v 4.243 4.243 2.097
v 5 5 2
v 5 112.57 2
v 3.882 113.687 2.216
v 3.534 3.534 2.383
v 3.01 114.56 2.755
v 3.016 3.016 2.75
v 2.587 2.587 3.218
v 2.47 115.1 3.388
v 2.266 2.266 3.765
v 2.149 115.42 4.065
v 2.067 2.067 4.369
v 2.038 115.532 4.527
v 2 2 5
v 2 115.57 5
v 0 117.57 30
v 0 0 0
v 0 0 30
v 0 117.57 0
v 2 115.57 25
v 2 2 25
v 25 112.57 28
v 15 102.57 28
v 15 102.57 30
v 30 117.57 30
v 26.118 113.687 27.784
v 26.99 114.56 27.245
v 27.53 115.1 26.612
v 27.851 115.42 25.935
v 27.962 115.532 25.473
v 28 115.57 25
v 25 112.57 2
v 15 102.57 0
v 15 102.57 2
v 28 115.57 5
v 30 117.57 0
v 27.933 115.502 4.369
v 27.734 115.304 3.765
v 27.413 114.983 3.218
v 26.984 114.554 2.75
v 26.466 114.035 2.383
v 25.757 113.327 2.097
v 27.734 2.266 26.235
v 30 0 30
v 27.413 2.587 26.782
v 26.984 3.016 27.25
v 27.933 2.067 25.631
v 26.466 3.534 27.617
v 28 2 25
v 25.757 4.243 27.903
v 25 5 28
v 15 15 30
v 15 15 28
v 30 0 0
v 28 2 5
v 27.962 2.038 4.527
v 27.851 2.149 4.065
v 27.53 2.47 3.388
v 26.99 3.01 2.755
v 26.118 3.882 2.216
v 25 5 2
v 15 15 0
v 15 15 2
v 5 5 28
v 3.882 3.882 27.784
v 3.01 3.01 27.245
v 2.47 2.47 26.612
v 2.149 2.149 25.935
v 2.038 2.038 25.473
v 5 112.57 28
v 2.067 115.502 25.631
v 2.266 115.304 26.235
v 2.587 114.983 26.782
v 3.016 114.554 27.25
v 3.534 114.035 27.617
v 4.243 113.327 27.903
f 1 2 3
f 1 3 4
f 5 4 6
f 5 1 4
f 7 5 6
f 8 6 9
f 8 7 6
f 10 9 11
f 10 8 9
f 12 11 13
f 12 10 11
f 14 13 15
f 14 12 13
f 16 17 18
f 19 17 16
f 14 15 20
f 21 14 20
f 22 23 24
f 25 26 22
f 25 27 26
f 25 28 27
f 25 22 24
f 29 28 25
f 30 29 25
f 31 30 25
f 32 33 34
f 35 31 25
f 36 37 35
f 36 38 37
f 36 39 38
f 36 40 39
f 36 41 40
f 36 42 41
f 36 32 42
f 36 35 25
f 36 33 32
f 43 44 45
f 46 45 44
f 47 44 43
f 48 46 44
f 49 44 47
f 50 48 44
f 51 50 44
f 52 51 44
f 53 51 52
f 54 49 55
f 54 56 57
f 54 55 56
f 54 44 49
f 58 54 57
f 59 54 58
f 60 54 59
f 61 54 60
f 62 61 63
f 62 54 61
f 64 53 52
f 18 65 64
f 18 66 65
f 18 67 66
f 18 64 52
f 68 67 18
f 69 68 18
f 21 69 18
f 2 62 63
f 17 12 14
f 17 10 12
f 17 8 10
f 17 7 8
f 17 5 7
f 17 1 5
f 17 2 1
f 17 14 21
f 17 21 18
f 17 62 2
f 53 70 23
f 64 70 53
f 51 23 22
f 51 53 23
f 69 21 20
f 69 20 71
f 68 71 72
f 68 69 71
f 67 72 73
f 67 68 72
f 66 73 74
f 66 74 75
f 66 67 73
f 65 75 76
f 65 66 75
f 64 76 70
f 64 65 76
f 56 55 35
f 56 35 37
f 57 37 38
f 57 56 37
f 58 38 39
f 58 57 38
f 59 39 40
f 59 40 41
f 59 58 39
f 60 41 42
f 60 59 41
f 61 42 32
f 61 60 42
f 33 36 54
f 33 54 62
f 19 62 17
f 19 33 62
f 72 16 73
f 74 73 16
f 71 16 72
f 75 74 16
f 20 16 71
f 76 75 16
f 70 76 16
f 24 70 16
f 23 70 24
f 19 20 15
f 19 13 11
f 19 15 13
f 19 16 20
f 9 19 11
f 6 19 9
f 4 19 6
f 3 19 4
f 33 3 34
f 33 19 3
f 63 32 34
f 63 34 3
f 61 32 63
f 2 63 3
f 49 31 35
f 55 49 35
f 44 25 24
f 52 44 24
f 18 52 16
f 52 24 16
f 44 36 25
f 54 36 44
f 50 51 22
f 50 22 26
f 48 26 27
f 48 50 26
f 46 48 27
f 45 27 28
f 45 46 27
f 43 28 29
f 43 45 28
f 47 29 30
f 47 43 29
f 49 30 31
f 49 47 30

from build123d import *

# Parameters (mm, degrees)
BOSS_EXTRU_1_DEPTH      = 30
ENL_V_MAT_EXTRU_1_DEPTH = 171


with BuildPart() as part:
    # Esquisse1 → Boss.-Extru.1 (new body)
    with BuildSketch(Plane.XY):
        Polygon((0, 0), (0, 117.56958174), (15, 102.56958174), (30, 117.56958174), (30, 0), (15, 15), align=None)
    extrude(amount=BOSS_EXTRU_1_DEPTH)

    # Esquisse2 → Enlèv. mat.-Extru.1 (cut)
    with BuildSketch(Plane(origin=(0, 0, 0), x_dir=(1, 0, 0), z_dir=(0, 1, 0))):
        with BuildLine():
            Line((5, -28), (25, -28))
            ThreePointArc((25, -28), (27.121320344, -27.121320344), (28, -25))
            Line((28, -25), (28, -5))
            ThreePointArc((28, -5), (27.121320344, -2.878679656), (25, -2))
            Line((25, -2), (5, -2))
            ThreePointArc((5, -2), (2.878679656, -2.878679656), (2, -5))
            Line((2, -5), (2, -25))
            ThreePointArc((2, -25), (2.878679656, -27.121320344), (5, -28))
        make_face()
    extrude(amount=ENL_V_MAT_EXTRU_1_DEPTH, mode=Mode.SUBTRACT)


solid = part.part
